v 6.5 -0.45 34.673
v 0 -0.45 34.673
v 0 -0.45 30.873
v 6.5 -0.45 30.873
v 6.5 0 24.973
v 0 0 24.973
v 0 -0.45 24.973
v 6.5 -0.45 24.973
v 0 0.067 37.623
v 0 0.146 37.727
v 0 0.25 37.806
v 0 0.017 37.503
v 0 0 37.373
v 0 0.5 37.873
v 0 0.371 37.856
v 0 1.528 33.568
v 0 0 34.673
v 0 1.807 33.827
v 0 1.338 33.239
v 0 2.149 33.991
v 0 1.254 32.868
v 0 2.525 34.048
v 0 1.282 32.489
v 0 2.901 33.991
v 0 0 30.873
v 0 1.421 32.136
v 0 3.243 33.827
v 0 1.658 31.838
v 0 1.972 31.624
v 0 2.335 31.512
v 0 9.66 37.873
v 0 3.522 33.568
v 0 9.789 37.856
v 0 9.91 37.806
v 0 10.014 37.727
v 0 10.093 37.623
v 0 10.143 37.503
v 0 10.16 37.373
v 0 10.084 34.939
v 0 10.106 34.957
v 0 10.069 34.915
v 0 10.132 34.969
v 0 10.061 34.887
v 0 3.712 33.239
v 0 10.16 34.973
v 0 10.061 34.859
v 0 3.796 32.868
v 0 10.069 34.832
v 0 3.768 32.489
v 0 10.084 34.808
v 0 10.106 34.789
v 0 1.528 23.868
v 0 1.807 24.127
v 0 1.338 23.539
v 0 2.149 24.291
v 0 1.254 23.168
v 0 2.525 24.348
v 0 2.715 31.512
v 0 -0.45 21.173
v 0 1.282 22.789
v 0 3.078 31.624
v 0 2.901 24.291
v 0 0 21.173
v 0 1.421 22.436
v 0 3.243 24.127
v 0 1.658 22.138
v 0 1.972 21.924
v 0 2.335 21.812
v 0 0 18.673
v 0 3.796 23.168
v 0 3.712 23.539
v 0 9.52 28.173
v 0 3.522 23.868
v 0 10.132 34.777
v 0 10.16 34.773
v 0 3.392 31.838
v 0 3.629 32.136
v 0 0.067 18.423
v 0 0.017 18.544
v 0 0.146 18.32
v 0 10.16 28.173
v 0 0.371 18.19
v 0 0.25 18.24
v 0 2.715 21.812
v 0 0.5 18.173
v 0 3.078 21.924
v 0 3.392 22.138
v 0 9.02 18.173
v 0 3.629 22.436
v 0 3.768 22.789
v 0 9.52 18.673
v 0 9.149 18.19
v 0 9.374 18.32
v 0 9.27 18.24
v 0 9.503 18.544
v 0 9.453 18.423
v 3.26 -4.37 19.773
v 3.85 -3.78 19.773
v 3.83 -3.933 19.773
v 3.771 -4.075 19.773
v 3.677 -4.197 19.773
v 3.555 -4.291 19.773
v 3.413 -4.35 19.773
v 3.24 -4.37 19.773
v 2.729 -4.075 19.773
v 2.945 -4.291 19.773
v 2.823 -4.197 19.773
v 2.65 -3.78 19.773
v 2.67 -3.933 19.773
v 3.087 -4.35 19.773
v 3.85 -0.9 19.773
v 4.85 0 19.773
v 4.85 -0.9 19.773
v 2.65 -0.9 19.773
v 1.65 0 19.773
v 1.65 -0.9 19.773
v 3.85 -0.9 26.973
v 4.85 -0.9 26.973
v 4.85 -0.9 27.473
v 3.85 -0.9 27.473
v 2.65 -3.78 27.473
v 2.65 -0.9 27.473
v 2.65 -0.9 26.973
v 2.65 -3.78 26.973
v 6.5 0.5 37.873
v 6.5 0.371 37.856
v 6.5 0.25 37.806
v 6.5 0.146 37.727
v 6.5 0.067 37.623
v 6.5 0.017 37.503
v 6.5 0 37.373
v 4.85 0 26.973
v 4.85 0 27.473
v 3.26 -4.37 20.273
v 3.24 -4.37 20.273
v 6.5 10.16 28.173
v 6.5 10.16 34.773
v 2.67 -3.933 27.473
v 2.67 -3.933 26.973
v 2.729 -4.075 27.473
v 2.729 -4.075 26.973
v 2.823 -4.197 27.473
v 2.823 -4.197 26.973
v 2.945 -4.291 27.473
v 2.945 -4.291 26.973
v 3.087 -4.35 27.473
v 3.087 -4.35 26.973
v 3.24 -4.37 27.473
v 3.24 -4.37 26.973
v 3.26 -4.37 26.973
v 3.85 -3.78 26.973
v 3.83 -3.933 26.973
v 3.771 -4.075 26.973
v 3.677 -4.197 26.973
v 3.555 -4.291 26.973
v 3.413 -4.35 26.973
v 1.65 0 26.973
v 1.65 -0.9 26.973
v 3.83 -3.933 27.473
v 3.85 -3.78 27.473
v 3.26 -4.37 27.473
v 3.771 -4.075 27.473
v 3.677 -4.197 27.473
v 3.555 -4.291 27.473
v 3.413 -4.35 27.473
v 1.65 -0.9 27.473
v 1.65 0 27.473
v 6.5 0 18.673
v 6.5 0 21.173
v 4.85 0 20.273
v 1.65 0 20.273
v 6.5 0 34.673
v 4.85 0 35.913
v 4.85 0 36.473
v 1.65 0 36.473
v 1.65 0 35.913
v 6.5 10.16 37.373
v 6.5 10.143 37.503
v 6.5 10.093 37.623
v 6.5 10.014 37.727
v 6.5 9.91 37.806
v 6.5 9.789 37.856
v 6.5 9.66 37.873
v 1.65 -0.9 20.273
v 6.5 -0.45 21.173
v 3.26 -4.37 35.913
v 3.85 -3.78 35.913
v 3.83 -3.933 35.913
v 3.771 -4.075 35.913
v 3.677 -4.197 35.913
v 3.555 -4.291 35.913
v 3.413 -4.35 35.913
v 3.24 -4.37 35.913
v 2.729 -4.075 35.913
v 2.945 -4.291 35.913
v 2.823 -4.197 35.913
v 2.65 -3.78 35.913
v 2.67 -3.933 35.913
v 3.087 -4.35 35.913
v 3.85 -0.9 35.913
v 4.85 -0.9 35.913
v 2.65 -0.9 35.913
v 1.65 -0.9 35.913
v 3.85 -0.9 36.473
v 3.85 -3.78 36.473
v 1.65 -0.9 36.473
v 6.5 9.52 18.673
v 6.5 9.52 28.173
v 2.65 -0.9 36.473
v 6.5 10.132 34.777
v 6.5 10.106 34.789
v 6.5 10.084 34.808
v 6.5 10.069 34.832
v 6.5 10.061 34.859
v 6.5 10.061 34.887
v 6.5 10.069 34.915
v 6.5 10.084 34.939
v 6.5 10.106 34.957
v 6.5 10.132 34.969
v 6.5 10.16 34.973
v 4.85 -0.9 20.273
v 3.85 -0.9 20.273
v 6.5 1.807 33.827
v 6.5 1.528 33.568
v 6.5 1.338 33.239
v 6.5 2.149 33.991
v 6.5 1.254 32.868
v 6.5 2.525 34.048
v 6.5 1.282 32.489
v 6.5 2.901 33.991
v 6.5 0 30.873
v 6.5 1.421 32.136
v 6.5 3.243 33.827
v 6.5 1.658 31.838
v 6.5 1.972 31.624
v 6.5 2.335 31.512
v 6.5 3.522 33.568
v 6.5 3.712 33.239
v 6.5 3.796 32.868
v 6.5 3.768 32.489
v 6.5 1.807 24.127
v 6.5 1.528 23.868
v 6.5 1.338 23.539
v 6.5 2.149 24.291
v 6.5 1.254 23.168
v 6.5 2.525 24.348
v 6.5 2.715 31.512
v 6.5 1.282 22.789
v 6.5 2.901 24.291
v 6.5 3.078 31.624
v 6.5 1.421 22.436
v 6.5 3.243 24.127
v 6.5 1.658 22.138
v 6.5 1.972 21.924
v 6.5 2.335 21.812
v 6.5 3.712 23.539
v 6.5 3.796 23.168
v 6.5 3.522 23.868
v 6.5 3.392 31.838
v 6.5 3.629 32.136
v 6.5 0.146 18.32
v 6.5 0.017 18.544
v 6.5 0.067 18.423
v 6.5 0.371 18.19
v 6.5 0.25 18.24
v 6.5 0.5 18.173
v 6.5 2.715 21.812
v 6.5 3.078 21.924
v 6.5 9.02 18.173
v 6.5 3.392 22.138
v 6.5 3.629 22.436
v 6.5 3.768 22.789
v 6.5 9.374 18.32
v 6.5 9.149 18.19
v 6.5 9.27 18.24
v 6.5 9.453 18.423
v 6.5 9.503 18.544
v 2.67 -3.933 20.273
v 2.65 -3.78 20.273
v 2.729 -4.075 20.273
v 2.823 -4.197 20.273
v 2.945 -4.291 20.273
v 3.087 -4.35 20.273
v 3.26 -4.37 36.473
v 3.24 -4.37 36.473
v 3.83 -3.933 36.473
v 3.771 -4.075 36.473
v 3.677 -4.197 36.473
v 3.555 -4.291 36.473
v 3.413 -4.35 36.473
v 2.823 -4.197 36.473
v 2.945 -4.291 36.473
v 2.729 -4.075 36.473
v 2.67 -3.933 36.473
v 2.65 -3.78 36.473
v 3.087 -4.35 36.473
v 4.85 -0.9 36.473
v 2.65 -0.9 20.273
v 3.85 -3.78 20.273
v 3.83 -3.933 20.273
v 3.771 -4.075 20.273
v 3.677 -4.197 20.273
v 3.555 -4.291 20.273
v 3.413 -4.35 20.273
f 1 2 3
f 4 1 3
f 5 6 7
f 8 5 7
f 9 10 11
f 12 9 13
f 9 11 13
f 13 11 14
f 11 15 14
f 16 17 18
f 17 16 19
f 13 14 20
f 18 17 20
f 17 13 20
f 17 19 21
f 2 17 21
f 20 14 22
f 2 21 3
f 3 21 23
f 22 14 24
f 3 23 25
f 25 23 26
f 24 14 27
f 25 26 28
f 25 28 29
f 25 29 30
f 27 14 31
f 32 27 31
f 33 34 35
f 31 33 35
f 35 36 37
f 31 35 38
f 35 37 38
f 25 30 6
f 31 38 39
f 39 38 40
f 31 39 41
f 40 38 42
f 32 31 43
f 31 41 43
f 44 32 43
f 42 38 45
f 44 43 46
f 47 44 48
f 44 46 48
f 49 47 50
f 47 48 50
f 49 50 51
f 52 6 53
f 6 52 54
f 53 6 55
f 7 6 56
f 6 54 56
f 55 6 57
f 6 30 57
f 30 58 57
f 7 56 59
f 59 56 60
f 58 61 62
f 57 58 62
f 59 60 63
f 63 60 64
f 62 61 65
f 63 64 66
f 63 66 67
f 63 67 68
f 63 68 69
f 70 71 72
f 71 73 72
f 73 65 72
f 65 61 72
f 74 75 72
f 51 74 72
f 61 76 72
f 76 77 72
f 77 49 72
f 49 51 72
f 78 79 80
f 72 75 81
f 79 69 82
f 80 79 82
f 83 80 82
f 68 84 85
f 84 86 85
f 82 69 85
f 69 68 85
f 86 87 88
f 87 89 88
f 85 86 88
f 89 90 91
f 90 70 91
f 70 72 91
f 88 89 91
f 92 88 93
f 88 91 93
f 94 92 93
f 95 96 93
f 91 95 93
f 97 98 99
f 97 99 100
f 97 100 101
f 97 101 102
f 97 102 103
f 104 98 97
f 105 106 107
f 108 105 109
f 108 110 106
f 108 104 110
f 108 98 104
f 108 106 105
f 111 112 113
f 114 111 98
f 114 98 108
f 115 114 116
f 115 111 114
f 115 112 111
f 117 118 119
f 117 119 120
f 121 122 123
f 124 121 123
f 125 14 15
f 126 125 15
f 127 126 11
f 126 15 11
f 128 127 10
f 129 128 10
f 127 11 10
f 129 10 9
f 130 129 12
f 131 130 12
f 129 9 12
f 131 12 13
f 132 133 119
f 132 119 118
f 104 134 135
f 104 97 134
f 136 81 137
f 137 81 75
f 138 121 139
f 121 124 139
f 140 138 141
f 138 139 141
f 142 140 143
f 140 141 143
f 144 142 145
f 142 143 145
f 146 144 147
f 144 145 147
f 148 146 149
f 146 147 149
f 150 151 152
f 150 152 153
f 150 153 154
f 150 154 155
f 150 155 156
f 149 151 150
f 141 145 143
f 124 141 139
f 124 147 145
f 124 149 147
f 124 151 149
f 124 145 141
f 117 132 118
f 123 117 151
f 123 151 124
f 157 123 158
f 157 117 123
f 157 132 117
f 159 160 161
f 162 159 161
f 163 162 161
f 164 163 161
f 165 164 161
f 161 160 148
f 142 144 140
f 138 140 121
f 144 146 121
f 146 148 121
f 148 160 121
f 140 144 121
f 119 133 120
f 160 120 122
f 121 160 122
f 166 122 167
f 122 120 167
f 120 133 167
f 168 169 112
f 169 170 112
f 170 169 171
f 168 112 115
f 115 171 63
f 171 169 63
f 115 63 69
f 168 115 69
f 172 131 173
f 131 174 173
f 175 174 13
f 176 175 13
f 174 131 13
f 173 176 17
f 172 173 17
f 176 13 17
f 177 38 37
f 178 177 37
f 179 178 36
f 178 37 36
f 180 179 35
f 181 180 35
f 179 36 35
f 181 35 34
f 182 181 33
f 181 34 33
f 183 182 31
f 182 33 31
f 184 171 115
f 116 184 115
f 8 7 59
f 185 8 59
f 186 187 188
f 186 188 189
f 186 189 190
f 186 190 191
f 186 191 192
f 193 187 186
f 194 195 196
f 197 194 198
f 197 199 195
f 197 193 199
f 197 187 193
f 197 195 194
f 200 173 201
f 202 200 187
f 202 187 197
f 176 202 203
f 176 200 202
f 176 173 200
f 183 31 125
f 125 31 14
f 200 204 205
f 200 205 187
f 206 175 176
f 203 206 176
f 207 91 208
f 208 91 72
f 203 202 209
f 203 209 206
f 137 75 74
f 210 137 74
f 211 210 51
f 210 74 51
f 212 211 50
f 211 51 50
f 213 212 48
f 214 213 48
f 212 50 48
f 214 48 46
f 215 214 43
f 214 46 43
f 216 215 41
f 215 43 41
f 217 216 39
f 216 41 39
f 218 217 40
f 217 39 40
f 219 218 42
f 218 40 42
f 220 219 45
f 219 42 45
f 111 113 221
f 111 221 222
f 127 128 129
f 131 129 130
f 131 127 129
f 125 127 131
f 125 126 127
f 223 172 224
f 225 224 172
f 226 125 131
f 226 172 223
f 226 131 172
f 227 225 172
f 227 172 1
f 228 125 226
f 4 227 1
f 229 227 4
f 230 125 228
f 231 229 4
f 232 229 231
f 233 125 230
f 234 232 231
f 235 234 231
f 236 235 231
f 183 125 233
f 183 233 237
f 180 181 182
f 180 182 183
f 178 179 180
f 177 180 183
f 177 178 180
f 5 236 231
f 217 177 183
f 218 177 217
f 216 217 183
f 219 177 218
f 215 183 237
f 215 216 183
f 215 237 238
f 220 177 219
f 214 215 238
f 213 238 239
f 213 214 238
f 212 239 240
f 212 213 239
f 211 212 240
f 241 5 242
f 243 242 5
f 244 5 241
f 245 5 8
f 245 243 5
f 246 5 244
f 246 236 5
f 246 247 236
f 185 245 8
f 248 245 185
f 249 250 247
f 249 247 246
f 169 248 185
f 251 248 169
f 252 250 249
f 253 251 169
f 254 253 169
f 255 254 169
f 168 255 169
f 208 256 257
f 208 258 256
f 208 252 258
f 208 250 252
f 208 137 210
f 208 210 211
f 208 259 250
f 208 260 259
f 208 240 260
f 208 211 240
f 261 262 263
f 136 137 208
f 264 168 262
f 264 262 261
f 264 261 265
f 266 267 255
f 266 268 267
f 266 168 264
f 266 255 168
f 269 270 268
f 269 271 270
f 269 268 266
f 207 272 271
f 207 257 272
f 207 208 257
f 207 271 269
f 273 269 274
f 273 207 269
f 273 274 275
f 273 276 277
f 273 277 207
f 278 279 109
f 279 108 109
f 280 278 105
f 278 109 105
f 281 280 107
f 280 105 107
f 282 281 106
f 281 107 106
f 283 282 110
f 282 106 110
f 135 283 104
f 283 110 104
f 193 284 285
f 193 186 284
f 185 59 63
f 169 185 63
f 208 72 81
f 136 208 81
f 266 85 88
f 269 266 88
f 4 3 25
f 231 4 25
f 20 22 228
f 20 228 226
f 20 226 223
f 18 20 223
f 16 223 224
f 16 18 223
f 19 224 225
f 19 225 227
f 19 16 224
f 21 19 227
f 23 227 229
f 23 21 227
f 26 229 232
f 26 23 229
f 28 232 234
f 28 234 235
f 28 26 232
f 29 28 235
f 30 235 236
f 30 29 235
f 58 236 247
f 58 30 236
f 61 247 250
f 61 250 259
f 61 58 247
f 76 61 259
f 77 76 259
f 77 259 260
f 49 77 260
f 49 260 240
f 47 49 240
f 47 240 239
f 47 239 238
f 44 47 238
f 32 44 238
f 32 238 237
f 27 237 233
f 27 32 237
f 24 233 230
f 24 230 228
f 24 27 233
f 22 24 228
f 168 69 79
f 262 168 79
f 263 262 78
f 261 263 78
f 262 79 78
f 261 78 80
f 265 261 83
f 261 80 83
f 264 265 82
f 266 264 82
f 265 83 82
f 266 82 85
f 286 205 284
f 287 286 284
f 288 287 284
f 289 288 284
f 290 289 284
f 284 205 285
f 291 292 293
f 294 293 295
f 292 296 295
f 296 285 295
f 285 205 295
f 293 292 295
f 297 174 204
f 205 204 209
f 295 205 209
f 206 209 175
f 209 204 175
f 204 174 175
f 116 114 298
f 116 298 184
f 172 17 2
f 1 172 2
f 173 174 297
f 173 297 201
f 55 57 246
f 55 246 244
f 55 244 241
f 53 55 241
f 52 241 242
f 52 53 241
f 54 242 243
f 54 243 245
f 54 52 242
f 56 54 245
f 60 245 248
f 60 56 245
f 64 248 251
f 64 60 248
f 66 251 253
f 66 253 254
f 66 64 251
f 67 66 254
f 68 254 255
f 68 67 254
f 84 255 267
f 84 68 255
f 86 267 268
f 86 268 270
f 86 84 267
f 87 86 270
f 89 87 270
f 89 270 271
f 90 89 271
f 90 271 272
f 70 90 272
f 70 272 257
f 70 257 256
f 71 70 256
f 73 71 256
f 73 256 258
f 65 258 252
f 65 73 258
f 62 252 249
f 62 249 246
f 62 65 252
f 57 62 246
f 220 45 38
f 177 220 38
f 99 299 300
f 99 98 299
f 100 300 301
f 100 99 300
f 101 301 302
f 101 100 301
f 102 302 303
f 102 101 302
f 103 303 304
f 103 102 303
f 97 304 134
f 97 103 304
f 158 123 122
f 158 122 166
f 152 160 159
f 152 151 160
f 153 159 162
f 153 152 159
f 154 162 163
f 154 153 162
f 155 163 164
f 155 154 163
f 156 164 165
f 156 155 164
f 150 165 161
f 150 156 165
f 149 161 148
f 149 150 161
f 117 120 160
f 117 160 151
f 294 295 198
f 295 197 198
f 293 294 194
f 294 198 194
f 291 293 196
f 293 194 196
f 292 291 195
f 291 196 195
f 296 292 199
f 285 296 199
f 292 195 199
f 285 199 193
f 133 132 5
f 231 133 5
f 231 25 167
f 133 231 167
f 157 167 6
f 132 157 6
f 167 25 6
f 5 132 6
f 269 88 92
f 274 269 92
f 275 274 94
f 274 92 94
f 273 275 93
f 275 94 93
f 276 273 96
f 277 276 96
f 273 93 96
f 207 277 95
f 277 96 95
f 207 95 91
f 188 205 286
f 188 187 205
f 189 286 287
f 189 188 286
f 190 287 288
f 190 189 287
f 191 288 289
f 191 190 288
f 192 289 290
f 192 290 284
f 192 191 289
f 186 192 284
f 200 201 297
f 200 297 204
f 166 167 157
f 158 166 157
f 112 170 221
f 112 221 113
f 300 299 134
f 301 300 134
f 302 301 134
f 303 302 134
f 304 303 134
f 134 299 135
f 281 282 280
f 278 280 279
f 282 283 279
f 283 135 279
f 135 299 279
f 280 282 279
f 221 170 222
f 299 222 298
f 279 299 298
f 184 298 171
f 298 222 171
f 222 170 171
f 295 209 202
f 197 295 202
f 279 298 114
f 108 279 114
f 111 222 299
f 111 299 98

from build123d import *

# Parameters (mm, degrees)
SKETCH1_R             = 1.275
BOSS_EXTRUDE1_DEPTH   = 6.5
SKETCH3_W             = 3.2
SKETCH3_H             = 0.56
SKETCH3_H_2           = 0.5
BOSS_EXTRUDE3_DEPTH   = 0.9
SKETCH4_W             = 1.2
SKETCH4_H             = 0.56
SKETCH4_H_2           = 0.5
BOSS_EXTRUDE4_DEPTH   = 3.47
FILLET2_R             = 0.59
ESBO_O1_R             = 0.1
CORTE_EXTRUS_O1_DEPTH = 40.747314551


with BuildPart() as part:
    # Sketch1 → Boss-Extrude1 (new body)
    with BuildSketch(Plane(origin=(0, 0, 0), x_dir=(0, 0, -1), z_dir=(1, 0, 0))):
        with BuildLine():
            Line((-37.373122581, 0), (-34.673122581, 0))
            Line((-34.673122581, 0), (-34.673122581, -0.45))
            Line((-34.673122581, -0.45), (-30.873122581, -0.45))
            Line((-30.873122581, -0.45), (-30.873122581, 0))
            Line((-30.873122581, 0), (-24.973122581, 0))
            Line((-24.973122581, 0), (-24.973122581, -0.45))
            Line((-24.973122581, -0.45), (-21.173122581, -0.45))
            Line((-21.173122581, -0.45), (-21.173122581, 0))
            Line((-21.173122581, 0), (-18.673122581, 0))
            ThreePointArc((-18.673122581, 0), (-18.31956919, 0.146446609), (-18.173122581, 0.5))
            Line((-18.173122581, 0.5), (-18.173122581, 9.02))
            ThreePointArc((-18.173122581, 9.02), (-18.31956919, 9.373553391), (-18.673122581, 9.52))
            Line((-18.673122581, 9.52), (-28.173122581, 9.52))
            Line((-28.173122581, 9.52), (-28.173122581, 10.16))
            Line((-28.173122581, 10.16), (-37.373122581, 10.16))
            ThreePointArc((-37.373122581, 10.16), (-37.726675972, 10.013553391), (-37.873122581, 9.66))
            Line((-37.873122581, 9.66), (-37.873122581, 0.5))
            ThreePointArc((-37.873122581, 0.5), (-37.726675972, 0.146446609), (-37.373122581, 0))
        make_face()
        with Locations(Location((-32.773122581, 2.525, 0), (0, 0, 180))):
            Circle(SKETCH1_R, mode=Mode.SUBTRACT)
        with Locations(Location((-23.073122581, 2.525, 0), (0, 0, 180))):
            Circle(SKETCH1_R, mode=Mode.SUBTRACT)
    extrude(amount=BOSS_EXTRUDE1_DEPTH)

    # Sketch3 → Boss-Extrude3 (add)
    with BuildSketch(Plane(origin=(0, 0, 0), x_dir=(-1, 0, 0), z_dir=(0, -1, 0))):
        with Locations((-3.25, -36.193122581)):
            Rectangle(SKETCH3_W, SKETCH3_H)
        with Locations((-3.25, -27.223122581)):
            Rectangle(SKETCH3_W, SKETCH3_H_2)
        with Locations((-3.25, -20.023122581)):
            Rectangle(SKETCH3_W, SKETCH3_H_2)
    extrude(amount=BOSS_EXTRUDE3_DEPTH)

    # Sketch4 → Boss-Extrude4 (add)
    with BuildSketch(Plane(origin=(0, -0.9, 0), x_dir=(-1, 0, 0), z_dir=(0, -1, 0))):
        with Locations((-3.25, -36.193122581)):
            Rectangle(SKETCH4_W, SKETCH4_H)
        with Locations((-3.25, -27.223122581)):
            Rectangle(SKETCH4_W, SKETCH4_H_2)
        with Locations((-3.25, -20.023122581)):
            Rectangle(SKETCH4_W, SKETCH4_H_2)
    extrude(amount=BOSS_EXTRUDE4_DEPTH)

    # Fillet2
    fillet2_edges = [part.edges().sort_by_distance(p)[0] for p in [
        (2.65, -4.37, 36.193122581),
        (3.85, -4.37, 36.193122581),
        (2.65, -4.37, 27.223122581),
        (3.85, -4.37, 27.223122581),
        (3.85, -4.37, 20.023122581),
        (2.65, -4.37, 20.023122581),
    ]]
    fillet(fillet2_edges, radius=FILLET2_R)

    # Esboço1 → Corte-extrusão1 (cut, through all)
    with BuildSketch(Plane.ZY):
        with Locations((34.873122581, 10.16)):
            Circle(ESBO_O1_R)
    extrude(amount=-CORTE_EXTRUS_O1_DEPTH, mode=Mode.SUBTRACT)


solid = part.part
